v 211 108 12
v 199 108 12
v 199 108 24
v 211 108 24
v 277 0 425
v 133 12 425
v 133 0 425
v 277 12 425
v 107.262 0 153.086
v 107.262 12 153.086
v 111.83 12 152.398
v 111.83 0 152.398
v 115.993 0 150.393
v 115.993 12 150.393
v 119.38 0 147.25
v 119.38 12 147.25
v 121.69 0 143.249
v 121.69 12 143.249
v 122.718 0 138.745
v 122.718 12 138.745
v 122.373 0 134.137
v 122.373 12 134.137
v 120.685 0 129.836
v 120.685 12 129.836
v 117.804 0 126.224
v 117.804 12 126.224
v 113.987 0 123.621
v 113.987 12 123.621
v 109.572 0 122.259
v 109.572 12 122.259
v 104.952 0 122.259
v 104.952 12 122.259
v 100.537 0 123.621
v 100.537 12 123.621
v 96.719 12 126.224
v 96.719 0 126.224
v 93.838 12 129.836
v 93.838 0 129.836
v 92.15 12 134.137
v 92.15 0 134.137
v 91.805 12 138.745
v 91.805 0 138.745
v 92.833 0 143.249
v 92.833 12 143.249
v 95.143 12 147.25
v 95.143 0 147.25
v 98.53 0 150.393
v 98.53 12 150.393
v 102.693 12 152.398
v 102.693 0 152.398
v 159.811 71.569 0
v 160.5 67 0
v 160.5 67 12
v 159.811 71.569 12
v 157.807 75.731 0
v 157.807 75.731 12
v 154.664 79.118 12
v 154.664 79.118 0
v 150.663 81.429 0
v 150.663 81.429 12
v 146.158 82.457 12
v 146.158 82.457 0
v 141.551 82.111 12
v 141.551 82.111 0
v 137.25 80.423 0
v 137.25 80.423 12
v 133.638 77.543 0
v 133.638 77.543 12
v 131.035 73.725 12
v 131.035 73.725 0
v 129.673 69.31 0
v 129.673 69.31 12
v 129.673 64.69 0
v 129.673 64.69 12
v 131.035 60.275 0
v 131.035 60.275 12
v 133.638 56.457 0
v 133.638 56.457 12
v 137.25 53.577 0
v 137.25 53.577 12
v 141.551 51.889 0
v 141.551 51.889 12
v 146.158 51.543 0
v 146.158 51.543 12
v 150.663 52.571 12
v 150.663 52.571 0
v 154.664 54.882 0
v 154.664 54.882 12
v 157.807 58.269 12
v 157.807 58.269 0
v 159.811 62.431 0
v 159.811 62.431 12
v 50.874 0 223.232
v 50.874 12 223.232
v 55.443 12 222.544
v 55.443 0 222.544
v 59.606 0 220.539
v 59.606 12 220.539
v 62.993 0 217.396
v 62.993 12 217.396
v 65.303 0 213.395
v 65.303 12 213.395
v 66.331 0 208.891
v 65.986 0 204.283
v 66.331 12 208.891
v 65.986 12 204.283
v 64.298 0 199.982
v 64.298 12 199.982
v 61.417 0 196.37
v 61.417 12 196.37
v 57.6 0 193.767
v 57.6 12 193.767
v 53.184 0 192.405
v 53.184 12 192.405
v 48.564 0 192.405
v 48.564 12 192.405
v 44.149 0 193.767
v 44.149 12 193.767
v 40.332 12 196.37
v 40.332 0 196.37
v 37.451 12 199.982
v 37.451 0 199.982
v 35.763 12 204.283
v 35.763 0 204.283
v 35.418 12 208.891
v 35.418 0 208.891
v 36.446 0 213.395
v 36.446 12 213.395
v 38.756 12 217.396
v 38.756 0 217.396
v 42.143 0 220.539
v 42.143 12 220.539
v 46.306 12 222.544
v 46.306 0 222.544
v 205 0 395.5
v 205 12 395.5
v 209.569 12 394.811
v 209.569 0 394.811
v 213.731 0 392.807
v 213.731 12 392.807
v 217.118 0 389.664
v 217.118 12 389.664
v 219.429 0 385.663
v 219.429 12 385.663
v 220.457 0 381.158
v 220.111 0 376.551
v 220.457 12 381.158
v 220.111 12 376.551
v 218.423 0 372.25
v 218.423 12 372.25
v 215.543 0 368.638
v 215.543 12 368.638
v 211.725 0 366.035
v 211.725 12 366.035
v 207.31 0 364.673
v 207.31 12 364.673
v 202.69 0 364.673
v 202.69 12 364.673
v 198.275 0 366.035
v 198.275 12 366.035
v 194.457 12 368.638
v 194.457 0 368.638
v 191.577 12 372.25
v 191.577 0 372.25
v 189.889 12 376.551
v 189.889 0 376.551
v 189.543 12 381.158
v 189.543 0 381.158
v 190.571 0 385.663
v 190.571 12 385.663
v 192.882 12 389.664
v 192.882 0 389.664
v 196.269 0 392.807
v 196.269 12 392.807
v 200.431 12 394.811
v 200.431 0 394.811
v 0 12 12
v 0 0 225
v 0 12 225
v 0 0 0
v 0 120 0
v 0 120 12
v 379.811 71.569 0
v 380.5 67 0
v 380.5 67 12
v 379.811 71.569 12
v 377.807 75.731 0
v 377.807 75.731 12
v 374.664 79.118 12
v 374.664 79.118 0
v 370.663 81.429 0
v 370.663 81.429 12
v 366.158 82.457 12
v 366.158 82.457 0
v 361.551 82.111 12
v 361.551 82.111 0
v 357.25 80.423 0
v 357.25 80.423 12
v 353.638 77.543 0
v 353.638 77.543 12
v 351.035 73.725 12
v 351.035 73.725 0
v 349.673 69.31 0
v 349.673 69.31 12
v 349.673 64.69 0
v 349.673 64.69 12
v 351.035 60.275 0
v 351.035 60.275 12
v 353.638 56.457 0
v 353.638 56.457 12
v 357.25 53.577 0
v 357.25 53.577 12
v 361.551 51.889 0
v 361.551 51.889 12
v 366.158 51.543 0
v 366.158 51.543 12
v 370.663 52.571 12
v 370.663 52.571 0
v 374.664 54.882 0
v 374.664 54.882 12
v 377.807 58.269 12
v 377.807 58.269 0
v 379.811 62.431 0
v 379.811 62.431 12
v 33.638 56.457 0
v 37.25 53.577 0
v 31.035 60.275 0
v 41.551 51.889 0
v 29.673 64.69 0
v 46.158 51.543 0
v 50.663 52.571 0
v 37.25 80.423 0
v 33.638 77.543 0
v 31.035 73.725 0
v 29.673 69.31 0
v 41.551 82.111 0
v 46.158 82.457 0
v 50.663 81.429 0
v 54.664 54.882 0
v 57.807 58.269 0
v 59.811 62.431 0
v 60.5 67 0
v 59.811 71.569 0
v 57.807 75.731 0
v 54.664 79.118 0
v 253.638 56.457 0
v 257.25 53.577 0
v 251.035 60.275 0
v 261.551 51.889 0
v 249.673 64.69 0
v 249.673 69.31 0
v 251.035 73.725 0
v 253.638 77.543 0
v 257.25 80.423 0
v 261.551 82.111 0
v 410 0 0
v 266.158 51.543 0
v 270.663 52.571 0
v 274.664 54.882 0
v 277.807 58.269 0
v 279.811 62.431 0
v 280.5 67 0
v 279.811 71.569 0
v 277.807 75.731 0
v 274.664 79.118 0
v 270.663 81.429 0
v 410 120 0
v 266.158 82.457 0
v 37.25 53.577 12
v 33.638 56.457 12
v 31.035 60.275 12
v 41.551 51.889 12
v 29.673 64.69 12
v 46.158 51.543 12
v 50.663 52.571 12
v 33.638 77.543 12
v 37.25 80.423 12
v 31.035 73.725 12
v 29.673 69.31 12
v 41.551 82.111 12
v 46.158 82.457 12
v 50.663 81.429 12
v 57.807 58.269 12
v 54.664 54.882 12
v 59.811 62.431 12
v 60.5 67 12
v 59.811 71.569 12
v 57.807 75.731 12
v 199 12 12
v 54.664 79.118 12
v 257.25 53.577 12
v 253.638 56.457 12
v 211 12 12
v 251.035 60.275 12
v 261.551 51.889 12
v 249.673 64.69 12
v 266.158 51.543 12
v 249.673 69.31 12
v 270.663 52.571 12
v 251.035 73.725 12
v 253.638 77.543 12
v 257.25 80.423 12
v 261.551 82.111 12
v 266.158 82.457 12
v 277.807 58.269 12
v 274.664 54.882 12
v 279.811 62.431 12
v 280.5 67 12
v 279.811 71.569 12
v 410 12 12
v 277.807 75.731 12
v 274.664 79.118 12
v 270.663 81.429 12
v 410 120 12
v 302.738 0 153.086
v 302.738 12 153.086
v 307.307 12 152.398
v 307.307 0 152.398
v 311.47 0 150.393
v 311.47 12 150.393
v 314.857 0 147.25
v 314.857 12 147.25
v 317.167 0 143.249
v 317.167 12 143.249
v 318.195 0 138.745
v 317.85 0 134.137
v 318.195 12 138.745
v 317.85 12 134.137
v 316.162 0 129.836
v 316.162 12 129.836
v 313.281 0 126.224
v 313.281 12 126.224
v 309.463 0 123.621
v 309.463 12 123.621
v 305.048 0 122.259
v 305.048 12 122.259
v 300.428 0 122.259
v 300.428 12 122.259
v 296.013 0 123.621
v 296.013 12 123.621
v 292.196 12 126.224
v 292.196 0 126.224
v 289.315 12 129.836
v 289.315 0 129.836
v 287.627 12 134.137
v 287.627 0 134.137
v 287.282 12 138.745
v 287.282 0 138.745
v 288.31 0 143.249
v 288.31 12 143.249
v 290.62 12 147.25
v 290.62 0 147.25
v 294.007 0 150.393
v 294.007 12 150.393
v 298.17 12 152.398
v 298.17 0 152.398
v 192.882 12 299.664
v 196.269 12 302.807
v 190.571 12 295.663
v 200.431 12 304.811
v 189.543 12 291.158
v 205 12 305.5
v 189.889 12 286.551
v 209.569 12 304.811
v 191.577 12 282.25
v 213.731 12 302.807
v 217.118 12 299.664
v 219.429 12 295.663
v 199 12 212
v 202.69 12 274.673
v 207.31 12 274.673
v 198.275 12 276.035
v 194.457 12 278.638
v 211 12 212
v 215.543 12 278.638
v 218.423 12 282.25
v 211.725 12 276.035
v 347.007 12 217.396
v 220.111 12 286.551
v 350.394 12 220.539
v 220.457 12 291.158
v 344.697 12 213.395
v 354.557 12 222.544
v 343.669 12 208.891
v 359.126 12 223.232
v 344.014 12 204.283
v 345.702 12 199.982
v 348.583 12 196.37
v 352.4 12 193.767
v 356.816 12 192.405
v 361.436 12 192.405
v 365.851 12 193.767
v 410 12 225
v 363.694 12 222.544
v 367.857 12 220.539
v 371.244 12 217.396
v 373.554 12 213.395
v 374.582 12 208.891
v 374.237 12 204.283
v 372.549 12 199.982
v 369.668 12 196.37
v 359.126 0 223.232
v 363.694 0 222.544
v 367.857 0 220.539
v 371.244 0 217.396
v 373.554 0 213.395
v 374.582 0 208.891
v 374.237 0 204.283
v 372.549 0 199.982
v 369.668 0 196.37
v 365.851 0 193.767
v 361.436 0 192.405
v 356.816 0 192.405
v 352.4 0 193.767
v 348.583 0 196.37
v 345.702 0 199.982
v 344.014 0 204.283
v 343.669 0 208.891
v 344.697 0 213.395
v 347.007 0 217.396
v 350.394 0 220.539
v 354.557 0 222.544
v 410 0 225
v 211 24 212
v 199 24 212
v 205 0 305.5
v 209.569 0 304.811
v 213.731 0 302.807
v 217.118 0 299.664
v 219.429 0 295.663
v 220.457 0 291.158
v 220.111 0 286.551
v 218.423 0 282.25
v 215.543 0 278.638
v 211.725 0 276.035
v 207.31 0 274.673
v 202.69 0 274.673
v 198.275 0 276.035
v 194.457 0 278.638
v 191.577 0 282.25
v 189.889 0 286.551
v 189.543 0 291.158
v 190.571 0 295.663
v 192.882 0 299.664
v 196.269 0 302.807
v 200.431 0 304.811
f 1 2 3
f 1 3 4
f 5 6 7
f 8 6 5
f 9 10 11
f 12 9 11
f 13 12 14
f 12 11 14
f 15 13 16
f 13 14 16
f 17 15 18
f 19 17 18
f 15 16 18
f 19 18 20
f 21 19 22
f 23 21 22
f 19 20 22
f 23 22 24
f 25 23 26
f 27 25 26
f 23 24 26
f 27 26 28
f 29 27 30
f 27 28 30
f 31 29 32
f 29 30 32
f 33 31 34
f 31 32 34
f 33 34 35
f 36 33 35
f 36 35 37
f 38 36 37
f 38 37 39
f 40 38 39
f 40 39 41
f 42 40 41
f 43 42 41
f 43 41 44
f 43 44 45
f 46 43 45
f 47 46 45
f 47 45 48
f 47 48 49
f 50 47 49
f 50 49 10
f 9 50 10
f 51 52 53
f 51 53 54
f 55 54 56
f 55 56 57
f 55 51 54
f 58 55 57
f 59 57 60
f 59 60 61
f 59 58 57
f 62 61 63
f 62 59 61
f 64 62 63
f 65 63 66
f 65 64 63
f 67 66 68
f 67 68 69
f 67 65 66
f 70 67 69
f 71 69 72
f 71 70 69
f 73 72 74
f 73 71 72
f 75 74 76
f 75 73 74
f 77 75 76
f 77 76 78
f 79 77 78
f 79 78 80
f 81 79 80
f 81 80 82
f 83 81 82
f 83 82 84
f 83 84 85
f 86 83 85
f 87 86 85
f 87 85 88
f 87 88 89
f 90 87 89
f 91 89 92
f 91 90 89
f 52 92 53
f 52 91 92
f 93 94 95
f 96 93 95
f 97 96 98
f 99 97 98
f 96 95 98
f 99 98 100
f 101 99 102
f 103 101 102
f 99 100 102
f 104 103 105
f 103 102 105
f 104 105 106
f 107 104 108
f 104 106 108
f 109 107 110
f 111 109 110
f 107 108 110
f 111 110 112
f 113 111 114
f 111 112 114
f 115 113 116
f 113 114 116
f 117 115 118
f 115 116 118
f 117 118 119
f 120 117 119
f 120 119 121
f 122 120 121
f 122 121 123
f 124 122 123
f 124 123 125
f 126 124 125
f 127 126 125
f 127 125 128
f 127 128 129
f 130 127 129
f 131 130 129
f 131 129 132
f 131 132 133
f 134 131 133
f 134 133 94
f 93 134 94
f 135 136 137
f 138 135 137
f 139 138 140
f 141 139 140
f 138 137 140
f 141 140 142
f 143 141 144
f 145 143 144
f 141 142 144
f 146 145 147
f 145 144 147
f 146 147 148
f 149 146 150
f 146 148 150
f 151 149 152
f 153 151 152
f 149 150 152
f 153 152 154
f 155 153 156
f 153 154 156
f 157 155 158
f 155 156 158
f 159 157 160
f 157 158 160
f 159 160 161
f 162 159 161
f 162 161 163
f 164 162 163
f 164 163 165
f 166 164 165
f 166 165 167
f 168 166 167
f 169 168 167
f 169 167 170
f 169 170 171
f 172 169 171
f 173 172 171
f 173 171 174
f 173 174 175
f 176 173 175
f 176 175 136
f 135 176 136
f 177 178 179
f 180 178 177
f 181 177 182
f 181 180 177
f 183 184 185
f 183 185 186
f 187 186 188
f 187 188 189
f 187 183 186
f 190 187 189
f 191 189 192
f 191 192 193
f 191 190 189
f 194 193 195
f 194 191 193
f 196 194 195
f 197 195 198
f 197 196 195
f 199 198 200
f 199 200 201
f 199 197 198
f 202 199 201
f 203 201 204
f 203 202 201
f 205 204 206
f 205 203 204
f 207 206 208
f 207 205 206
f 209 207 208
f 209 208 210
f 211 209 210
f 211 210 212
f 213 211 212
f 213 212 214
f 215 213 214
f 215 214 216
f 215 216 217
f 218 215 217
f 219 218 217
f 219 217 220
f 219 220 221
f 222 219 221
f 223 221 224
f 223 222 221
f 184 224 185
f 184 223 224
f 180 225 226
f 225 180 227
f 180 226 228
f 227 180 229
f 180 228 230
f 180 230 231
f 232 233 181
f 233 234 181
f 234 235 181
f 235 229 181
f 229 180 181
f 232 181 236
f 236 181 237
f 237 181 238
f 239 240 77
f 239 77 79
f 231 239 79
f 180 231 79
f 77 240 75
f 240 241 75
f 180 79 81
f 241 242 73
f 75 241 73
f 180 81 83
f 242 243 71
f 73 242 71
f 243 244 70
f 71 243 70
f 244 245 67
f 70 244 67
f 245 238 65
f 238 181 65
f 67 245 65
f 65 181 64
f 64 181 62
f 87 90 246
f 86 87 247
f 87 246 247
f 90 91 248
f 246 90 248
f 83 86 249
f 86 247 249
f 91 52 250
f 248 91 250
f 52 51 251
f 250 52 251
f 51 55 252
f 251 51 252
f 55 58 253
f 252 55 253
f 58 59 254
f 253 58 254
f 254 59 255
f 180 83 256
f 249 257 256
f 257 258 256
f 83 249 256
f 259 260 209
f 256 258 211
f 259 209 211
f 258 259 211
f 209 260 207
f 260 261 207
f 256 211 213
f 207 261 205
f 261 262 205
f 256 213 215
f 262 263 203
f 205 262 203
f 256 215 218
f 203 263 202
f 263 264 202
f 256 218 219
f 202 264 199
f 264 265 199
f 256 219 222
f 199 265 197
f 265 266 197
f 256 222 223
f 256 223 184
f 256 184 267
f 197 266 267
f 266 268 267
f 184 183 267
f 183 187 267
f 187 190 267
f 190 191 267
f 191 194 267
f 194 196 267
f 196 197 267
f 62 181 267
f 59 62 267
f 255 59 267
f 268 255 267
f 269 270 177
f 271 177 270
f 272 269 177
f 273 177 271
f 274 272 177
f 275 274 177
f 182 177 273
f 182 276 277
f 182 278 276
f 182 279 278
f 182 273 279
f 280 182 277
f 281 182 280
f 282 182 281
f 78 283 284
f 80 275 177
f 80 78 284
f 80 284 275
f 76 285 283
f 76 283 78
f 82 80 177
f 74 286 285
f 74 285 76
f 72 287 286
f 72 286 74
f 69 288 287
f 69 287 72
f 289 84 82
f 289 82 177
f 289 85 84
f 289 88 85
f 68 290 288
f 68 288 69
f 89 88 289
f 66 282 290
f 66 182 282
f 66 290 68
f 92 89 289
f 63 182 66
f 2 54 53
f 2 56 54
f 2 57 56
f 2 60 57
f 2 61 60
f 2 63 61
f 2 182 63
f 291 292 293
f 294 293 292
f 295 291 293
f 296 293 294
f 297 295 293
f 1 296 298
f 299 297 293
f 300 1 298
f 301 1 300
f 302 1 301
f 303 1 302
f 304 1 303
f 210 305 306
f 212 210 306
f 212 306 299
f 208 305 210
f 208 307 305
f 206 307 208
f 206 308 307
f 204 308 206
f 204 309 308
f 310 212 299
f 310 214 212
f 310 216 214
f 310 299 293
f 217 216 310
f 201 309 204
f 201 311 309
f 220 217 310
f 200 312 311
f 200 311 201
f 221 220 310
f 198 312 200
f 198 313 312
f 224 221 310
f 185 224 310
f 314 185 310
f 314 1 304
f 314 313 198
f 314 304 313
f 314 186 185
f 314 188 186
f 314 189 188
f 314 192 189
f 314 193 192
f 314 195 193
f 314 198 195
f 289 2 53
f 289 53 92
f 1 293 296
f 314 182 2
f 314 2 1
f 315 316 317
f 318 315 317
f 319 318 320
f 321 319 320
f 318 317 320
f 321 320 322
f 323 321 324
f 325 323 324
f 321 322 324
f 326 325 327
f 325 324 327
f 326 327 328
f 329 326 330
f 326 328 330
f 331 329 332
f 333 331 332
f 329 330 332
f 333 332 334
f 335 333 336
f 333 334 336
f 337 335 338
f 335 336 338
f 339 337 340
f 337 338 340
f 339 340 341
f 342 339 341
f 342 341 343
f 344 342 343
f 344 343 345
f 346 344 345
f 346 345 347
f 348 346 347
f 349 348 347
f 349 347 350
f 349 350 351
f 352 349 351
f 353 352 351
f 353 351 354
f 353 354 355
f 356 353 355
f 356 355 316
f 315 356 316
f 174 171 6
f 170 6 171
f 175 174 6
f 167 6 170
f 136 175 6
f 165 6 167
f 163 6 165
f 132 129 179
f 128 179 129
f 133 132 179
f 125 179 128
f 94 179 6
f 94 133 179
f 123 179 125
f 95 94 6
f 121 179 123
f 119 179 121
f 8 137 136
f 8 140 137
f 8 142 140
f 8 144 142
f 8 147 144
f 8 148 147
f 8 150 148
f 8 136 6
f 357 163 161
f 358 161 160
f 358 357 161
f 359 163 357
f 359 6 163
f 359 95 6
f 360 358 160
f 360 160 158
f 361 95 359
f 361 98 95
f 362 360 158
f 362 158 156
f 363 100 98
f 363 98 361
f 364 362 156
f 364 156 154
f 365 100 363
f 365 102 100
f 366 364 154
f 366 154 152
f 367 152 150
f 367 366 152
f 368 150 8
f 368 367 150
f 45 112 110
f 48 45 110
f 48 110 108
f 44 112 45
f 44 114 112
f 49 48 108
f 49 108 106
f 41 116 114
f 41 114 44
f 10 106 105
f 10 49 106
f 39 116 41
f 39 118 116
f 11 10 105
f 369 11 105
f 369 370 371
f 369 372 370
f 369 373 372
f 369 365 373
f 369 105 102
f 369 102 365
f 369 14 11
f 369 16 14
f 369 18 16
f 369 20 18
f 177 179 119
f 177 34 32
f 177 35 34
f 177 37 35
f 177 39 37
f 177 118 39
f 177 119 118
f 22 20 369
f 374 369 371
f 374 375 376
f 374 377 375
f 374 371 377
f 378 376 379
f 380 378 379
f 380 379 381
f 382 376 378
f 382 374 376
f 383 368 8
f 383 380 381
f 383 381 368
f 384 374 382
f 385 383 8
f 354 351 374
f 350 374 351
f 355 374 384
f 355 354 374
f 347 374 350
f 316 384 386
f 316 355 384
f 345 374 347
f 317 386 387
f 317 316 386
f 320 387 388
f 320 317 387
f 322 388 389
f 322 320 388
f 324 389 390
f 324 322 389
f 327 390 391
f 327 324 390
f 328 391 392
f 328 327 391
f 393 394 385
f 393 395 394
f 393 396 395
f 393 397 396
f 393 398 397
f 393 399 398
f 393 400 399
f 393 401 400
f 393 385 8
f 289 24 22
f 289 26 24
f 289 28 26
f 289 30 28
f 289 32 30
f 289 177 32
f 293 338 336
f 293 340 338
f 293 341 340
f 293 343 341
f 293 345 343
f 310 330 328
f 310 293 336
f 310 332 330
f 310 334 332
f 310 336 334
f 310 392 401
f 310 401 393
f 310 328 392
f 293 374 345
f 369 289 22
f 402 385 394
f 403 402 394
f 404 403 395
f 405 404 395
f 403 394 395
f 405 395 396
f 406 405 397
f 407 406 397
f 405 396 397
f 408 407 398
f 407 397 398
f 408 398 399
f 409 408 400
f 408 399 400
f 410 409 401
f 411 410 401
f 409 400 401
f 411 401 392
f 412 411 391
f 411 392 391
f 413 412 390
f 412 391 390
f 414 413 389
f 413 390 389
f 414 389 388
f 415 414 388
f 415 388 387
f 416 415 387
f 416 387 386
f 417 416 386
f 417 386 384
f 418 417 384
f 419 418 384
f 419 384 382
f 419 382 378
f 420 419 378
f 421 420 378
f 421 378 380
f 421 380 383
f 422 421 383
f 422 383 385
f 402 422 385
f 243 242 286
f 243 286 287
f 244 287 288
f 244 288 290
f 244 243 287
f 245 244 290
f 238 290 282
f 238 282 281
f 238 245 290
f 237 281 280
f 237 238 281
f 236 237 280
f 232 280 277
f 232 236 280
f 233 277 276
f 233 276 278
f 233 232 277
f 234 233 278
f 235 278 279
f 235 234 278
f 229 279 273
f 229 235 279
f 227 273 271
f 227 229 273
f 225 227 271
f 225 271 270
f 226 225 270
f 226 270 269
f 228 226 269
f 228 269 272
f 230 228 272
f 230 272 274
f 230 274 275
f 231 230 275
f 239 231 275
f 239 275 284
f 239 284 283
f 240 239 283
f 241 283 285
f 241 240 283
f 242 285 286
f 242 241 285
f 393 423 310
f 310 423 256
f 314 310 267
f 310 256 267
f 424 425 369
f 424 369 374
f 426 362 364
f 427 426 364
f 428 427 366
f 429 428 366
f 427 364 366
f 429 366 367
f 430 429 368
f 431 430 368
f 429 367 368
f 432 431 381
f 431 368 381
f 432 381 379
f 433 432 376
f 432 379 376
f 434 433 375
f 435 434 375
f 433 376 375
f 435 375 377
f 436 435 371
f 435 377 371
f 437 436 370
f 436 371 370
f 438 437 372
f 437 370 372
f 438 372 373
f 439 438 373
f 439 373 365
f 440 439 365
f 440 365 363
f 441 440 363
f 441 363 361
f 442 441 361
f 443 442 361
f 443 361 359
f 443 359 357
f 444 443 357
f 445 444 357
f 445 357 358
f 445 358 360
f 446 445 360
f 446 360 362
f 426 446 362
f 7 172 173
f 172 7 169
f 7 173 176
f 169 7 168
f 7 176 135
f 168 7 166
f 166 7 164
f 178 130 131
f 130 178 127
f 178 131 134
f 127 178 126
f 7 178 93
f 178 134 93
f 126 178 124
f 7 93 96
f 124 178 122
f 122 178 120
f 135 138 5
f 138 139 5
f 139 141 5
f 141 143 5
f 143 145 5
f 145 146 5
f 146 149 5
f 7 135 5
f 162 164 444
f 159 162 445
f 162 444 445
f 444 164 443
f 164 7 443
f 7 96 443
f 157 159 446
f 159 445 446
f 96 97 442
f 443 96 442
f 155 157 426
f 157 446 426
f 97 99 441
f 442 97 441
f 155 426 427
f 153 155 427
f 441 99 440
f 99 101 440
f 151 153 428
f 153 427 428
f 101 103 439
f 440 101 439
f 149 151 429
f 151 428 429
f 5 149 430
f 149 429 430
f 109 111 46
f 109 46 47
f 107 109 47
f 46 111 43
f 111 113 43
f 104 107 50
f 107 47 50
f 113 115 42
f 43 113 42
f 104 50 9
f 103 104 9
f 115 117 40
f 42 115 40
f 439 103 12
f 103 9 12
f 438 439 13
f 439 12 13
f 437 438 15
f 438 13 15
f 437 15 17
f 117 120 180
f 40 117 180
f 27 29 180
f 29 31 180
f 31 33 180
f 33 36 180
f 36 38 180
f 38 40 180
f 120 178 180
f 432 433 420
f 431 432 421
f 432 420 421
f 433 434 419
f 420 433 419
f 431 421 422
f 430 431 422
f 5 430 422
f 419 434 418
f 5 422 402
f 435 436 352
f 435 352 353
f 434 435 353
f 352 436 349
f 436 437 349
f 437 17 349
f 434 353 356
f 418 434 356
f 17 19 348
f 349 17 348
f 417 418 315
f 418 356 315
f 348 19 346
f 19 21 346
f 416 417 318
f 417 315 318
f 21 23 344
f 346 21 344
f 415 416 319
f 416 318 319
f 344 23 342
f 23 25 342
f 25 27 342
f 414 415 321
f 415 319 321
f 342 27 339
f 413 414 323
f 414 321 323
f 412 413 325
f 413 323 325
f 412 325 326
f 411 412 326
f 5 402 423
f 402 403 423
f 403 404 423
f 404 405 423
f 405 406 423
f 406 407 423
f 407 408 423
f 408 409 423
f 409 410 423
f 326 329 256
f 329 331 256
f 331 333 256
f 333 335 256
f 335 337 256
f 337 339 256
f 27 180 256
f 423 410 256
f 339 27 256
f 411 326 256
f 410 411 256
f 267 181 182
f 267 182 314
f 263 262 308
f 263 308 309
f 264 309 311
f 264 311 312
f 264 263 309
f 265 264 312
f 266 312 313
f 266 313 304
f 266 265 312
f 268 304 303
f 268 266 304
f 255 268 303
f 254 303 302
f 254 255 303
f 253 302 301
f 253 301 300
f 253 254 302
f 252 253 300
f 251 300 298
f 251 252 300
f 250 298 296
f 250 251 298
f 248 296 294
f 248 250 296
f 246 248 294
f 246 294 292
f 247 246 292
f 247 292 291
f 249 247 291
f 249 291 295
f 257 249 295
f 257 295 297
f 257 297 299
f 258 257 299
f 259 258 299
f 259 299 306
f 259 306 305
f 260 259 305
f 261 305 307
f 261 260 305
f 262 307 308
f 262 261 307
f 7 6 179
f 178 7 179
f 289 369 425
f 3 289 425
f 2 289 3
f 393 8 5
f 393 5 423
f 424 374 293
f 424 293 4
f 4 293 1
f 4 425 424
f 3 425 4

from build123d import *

# Parameters (mm, degrees)
SKETCH1_W      = 410
SKETCH1_H      = 120
SKETCH1_R      = 15.5
EXTRUDE1_DEPTH = 12
SKETCH2_W      = 410
SKETCH2_H      = 12
EXTRUDE2_DEPTH = 413
SKETCH3_R      = 15.5
EXTRUDE3_DEPTH = 413
SKETCH4_W      = 12
SKETCH4_H      = 96
EXTRUDE4_DEPTH = 200
EXTRUDE5_DEPTH = 200


with BuildPart() as part:
    # Sketch1 → Extrude1 (new body)
    with BuildSketch(Plane.XY):
        with Locations((205, 60)):
            Rectangle(SKETCH1_W, SKETCH1_H)
        with Locations((45, 67)):
            Circle(SKETCH1_R, mode=Mode.SUBTRACT)
        with Locations((145, 67)):
            Circle(SKETCH1_R, mode=Mode.SUBTRACT)
        with Locations((265, 67)):
            Circle(SKETCH1_R, mode=Mode.SUBTRACT)
        with Locations((365, 67)):
            Circle(SKETCH1_R, mode=Mode.SUBTRACT)
    extrude(amount=EXTRUDE1_DEPTH)

    # Sketch2 → Extrude2 (add)
    with BuildSketch(Plane.XY.offset(12)):
        with Locations((205, 6)):
            Rectangle(SKETCH2_W, SKETCH2_H)
    extrude(amount=EXTRUDE2_DEPTH)

    # Sketch3 → Extrude3 (cut)
    with BuildSketch(Plane(origin=(0, 12, 0), x_dir=(1, 0, 0), z_dir=(0, 1, 0))):
        with Locations(Location((302.738221798, -137.586347917, 0), (0, 0, 270))):
            Circle(SKETCH3_R)
        with Locations(Location((359.125657451, -207.732317869, 0), (0, 0, 270))):
            Circle(SKETCH3_R)
        with Locations(Location((107.261778202, -137.586347917, 0), (0, 0, 270))):
            Circle(SKETCH3_R)
        with Locations(Location((50.874342549, -207.732317869, 0), (0, 0, 270))):
            Circle(SKETCH3_R)
        with Locations(Location((205, -380, 0), (0, 0, 270))):
            Circle(SKETCH3_R)
        with Locations(Location((205, -290, 0), (0, 0, 270))):
            Circle(SKETCH3_R)
        Polygon((0, -425), (133, -425), (0, -225), align=None)
        Polygon((410, -425), (277, -425), (410, -225), align=None)
    extrude(amount=-EXTRUDE3_DEPTH, mode=Mode.SUBTRACT)

    # Sketch4 → Extrude4 (add)
    with BuildSketch(Plane.XY.offset(12)):
        with Locations((205, 60)):
            Rectangle(SKETCH4_W, SKETCH4_H)
    extrude(amount=EXTRUDE4_DEPTH)

    # Sketch5 → Extrude5 (cut)
    with BuildSketch(Plane.ZY.offset(-199)):
        Polygon((212, 108), (212, 24), (24, 108), align=None)
    extrude(amount=-EXTRUDE5_DEPTH, mode=Mode.SUBTRACT)


solid = part.part
